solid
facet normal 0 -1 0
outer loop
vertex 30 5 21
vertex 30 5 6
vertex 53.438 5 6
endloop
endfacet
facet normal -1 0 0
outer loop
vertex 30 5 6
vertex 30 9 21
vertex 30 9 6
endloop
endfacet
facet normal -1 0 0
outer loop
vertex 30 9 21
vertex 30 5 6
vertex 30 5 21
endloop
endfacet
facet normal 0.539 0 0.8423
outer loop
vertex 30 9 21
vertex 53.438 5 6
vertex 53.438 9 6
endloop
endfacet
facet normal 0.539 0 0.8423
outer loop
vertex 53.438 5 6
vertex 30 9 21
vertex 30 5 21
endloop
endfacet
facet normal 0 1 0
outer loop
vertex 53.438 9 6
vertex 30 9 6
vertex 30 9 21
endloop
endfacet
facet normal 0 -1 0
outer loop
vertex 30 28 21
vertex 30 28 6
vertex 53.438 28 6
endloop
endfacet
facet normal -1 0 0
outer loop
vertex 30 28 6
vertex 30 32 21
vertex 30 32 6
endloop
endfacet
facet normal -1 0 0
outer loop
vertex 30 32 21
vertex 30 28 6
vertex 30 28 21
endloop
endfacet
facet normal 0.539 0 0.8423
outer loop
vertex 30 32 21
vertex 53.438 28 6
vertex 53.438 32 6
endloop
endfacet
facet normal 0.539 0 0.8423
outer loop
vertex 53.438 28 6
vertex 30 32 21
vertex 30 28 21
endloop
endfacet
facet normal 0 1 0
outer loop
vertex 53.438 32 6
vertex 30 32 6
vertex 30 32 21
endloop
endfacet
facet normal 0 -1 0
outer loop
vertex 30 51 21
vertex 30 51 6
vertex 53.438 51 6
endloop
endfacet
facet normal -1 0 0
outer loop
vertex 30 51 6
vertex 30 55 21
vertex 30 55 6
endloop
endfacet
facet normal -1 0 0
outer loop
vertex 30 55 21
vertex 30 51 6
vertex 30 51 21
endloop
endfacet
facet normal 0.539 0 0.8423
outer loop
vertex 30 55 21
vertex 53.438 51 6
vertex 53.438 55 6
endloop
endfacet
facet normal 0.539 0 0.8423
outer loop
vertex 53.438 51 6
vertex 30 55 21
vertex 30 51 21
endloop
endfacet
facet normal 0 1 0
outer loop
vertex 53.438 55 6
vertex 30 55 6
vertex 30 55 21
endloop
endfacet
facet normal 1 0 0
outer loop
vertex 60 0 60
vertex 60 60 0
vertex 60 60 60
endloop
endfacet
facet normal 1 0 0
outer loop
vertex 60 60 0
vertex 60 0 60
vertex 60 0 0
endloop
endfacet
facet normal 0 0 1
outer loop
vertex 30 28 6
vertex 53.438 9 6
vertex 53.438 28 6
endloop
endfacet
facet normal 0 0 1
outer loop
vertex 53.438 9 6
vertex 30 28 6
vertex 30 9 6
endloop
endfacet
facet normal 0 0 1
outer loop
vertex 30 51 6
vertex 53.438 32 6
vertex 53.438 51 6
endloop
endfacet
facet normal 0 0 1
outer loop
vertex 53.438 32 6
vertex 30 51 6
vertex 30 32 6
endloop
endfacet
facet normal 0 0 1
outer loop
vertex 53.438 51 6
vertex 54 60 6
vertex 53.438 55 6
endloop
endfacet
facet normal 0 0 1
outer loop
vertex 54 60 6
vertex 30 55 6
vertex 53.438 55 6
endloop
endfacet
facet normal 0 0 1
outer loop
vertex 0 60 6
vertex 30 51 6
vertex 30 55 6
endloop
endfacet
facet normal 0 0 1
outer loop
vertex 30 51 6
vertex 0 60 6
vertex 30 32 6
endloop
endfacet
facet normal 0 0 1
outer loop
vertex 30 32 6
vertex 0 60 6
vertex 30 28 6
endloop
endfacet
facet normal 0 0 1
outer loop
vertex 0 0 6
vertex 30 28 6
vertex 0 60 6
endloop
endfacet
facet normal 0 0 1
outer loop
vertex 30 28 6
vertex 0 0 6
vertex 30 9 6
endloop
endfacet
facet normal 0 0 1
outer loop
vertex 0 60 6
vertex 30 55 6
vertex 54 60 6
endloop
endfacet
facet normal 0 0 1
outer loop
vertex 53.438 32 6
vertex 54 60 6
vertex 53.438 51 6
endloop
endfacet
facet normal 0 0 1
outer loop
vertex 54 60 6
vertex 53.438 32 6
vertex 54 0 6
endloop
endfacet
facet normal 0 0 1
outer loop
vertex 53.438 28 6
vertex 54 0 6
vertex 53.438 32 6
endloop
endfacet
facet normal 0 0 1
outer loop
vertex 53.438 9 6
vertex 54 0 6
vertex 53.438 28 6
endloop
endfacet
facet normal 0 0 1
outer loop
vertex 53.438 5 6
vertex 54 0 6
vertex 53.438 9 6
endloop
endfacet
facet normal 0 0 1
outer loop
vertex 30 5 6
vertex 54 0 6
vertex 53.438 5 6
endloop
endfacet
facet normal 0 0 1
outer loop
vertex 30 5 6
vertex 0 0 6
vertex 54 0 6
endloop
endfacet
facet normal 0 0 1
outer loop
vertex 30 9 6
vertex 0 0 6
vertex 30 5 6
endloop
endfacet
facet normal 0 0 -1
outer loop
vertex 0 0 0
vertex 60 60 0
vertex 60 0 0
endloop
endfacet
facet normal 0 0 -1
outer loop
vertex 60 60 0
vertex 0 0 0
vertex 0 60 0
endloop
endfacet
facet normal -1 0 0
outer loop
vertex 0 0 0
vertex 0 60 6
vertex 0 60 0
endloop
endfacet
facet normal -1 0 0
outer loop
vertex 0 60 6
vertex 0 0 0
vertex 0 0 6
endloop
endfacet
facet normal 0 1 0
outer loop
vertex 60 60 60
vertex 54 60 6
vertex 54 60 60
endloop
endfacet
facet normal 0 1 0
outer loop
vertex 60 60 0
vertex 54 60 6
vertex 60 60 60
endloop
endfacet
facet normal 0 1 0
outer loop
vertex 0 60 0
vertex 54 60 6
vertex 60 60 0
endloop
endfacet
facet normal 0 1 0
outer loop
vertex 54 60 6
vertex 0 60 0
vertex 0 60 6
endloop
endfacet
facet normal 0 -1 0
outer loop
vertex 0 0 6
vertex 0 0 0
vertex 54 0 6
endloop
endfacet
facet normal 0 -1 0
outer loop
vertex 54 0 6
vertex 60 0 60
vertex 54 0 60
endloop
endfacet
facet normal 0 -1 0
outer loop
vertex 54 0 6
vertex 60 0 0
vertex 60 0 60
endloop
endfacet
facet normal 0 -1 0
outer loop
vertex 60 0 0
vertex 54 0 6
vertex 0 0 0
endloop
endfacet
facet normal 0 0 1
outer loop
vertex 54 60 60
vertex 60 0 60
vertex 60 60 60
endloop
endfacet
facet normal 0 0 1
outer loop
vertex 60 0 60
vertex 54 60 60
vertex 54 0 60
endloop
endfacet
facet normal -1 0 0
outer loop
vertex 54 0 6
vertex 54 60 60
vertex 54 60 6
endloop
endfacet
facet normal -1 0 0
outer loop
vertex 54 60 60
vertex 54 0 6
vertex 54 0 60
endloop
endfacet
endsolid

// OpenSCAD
$fn = 32;

// ----------------------------------------------------------------------
// Rib bracket: 3-gusset L bracket
// ----------------------------------------------------------------------

// --- parameters (mm) ---
base_l = 60;              // foot length, X
base_w = 60;              // foot width, Y
base_t = 6;               // foot thickness
plate_t = 6;              // upright plate thickness
plate_h = 60;             // overall height
gus_l = 24;               // gusset leg along the foot
gus_h = 16;               // gusset height
gus_t = 4;                // gusset thickness
gus_edge = 5;             // gusset margin from the foot edge
n_gus = 3;                // gusset count

gus_pitch = (base_w - 2 * gus_edge - gus_t) / (n_gus - 1);  // gusset pitch

union() {
  cube([base_l, base_w, base_t]);
  translate([base_l - plate_t, 0, base_t - 1])
    cube([plate_t, base_w, plate_h - base_t + 1]);
  for (i = [0 : n_gus - 1])
    translate([base_l - plate_t - gus_l, gus_edge + i * gus_pitch, base_t - 1])
      rotate([-90, 0, 0])
        linear_extrude(height = gus_t)
          polygon(points = [[0, 0], [gus_l + 1, 0], [0, -gus_h]]);
}
